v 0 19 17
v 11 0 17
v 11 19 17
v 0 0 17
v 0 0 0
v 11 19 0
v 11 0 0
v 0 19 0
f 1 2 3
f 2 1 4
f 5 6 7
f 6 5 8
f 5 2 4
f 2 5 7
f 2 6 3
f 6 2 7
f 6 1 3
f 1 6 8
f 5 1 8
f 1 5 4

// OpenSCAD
// Generated by SolidPython 1.0.1 on 2020-07-29 00:46:55


cube(size = [11, 19, 17]);
/***********************************************
*********      SolidPython code:      **********
************************************************
 
# import packages: SolidPython
from solid import *
from solid.utils import *
from itertools import chain, combinations, permutations


class Resize:

    def __init__(self, scad_file):
        self.scad_file = scad_file
        #self.scad_file = import_scad(scad_file)
        # cone/cylinder param:
        self.r1 = 0
        self.r2 = 0
        self.h = 0
        # rectangular prism param:
        self.w = 0
        self.l = 0
        # ellipse param:
        self.r = 0

    # import OpenScad code (file name corresponds to shape)


    # classify shape + parameters
    def assign(self, param1, param2, param3):
        if self.scad_file == 'cone.scad':
            self.r1 = param1
            self.r2 = param2
            self.h = param3
        elif self.scad_file == 'cylinder.scad':
            self.r1 = param1
            self.r2 = param2
            self.h = param3
        elif self.scad_file == 'rectangularPrism.scad':
            self.h = param1
            self.l = param2
            self.w = param3
        else:
            self.r = param1
            self.h = param2

    # resize parameters
    def iterate(self):
        x = range(3, 20, 2)
        i = 1
        if self.scad_file == 'cone.scad':
            tempList = list(permutations(x, 2))
            for temp in tempList:
                param1 = temp[0]
                param2 = temp[1]
                filepath = 'produced_scad_files/' + 'cone' + str(param1) + '_' + str(param2) + '_' + '.scad'
                scad_render_to_file(cylinder(h=param1, r1=param2, r2=0), filepath)

        elif self.scad_file == 'cylinder.scad':
            tempList = list(permutations(x, 3))
            for temp in tempList:
                param1 = temp[0]
                param2 = temp[1]
                filepath = 'produced_scad_files/' + 'cylinder' + str(param1) + '_' + str(param2) + '_' + '.scad'
                scad_render_to_file(cylinder(h=param1, r1=param2, r2=param2), filepath)

        elif self.scad_file == 'rectangularPrism.scad':
            tempList = list(permutations(x, 3))
            for temp in tempList:
                param1 = temp[0]
                param2 = temp[1]
                param3 = temp[2]
                filepath = 'produced_scad_files/' + 'rectangularPrism' + str(param1) + '_' + str(param2) + '_' + str(
                    param3) + '.scad'
                scad_render_to_file(cube(size=(param1, param2, param3)), filepath)

        elif self.scad_file == 'ellipse.scad':
            tempList = list(permutations(x, 4))
            for temp in tempList:
                param1 = temp[0]
                param2 = temp[1]
                param3 = temp[2]
                param4 = temp[3]
                filepath = 'produced_scad_files/' + 'ellipse' + str(param1) + '_' + str(param2) + '_' + str(param3) + '_' + str(param4) + '.scad'
                scad_render_to_file(scale([param1, param2, param3])(sphere(r=param4)), filepath)

    def render_to_scadfile(self):
        scad_render_to_file(scad, 'example.scad') 
 
************************************************/
